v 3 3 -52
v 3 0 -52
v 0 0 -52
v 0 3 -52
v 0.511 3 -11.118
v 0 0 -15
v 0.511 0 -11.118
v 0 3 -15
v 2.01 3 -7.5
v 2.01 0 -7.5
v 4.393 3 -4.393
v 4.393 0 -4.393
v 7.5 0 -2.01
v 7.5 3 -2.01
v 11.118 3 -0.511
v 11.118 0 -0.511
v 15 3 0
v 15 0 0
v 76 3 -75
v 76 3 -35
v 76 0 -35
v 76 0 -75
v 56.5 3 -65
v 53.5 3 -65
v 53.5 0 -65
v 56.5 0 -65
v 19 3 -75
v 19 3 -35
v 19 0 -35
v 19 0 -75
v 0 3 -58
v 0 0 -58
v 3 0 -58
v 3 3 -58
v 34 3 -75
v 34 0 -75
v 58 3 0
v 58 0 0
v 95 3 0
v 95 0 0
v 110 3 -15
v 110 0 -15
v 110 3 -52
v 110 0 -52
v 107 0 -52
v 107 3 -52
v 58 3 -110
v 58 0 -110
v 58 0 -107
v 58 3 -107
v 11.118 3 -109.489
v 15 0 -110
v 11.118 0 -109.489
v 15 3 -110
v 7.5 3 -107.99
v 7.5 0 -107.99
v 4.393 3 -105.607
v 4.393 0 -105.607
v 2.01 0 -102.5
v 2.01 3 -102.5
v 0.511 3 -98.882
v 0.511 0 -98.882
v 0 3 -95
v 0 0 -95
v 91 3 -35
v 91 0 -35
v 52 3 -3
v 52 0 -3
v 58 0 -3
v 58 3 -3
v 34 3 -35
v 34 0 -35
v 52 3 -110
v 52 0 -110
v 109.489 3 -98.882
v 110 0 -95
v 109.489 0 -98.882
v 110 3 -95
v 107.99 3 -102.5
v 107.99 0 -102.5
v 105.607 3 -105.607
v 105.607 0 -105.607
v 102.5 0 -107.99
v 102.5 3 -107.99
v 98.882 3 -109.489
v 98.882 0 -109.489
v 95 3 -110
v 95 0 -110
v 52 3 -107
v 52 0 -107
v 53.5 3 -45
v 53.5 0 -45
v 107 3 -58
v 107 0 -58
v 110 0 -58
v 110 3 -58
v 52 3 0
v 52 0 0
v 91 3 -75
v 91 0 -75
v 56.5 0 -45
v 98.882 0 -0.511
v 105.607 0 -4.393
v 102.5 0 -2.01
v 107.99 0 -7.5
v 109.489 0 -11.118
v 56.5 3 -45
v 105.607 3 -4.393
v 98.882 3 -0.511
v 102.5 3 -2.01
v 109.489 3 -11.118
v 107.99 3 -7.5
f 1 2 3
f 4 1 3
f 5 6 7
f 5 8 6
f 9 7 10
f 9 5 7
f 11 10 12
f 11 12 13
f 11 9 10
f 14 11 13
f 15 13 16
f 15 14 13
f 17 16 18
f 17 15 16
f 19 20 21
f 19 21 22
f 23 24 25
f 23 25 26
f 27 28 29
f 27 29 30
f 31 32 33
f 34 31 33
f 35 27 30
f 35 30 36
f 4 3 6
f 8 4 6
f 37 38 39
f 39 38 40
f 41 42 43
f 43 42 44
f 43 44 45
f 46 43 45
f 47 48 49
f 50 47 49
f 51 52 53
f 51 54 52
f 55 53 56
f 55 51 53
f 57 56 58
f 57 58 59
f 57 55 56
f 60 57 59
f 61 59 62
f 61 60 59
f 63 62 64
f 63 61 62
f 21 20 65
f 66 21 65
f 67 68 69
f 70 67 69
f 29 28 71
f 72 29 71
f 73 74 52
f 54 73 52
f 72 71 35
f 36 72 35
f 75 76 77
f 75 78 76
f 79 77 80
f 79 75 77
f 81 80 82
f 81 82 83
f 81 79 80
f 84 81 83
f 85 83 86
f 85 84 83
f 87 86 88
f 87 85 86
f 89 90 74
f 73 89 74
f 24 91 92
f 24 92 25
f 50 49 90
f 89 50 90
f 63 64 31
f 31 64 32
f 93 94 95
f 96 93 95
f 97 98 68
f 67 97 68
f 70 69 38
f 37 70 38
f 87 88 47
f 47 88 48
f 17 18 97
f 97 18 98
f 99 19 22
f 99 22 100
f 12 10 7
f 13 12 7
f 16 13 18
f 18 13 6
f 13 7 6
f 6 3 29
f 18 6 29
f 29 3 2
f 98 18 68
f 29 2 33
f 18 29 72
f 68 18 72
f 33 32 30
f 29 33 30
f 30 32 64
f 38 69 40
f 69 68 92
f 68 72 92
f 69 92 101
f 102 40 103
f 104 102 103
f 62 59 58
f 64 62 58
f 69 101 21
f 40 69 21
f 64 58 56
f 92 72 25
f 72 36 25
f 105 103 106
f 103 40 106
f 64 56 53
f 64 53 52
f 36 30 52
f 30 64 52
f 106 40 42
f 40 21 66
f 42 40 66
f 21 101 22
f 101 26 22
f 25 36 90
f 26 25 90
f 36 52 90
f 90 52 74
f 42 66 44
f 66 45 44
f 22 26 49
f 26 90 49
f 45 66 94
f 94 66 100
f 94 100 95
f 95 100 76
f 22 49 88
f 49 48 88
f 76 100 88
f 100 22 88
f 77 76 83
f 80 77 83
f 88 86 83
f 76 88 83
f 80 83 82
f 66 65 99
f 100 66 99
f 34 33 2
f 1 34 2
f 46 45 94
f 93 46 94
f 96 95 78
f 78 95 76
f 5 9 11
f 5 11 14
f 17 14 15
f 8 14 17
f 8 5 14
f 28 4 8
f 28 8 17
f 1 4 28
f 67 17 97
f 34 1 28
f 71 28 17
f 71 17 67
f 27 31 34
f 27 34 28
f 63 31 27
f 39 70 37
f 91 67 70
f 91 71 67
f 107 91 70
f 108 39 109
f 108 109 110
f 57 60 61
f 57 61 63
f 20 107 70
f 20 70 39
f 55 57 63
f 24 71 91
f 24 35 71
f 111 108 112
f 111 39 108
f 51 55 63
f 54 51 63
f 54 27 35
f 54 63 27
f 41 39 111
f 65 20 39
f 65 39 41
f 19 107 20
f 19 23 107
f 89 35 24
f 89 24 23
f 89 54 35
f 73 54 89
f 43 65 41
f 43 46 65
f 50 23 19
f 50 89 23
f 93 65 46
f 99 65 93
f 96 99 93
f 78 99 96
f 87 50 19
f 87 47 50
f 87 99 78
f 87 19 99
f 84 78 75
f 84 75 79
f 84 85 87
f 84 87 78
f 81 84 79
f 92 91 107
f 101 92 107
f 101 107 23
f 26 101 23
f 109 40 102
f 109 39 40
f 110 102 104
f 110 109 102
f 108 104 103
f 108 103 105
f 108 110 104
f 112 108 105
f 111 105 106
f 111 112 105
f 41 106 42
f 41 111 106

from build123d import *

# Parameters (mm, degrees)
EXTRUDE_3_DEPTH    = 3
FILLET1_R          = 15
SKETCH1_W          = 15
SKETCH1_H          = 40
SKETCH1_W_2        = 3
SKETCH1_H_2        = 20
CUT_EXTRUDE1_DEPTH = 10


with BuildPart() as part:
    # Эскиз4 → Бобышка-Вытянуть3 (new body)
    with BuildSketch(Plane(origin=(0, 0, 0), x_dir=(1, 0, 0), z_dir=(0, 1, 0))):
        Polygon((0, 52), (0, 0), (52, 0), (52, 3), (55, 3), (58, 3), (58, 0), (110, 0), (110, 52), (107, 52), (107, 55), (107, 58), (110, 58), (110, 110), (58, 110), (58, 107), (55, 107), (52, 107), (52, 110), (0, 110), (0, 58), (3, 58), (3, 55), (3, 52), align=None)
    extrude(amount=EXTRUDE_3_DEPTH)

    # Fillet1
    fillet1_edges = [part.edges().sort_by_distance(p)[0] for p in [
        (110, 1.5, 0),
        (0, 1.5, 0),
        (0, 1.5, -110),
        (110, 1.5, -110),
    ]]
    fillet(fillet1_edges, radius=FILLET1_R)

    # Sketch1 → Cut-Extrude1 (cut)
    with BuildSketch(Plane(origin=(0, 3, 0), x_dir=(1, 0, 0), z_dir=(0, 1, 0))):
        with Locations((26.5, 55)):
            Rectangle(SKETCH1_W, SKETCH1_H)
        with Locations((55, 55)):
            Rectangle(SKETCH1_W_2, SKETCH1_H_2)
        with Locations((83.5, 55)):
            Rectangle(SKETCH1_W, SKETCH1_H)
    extrude(amount=-CUT_EXTRUDE1_DEPTH, mode=Mode.SUBTRACT)


solid = part.part
